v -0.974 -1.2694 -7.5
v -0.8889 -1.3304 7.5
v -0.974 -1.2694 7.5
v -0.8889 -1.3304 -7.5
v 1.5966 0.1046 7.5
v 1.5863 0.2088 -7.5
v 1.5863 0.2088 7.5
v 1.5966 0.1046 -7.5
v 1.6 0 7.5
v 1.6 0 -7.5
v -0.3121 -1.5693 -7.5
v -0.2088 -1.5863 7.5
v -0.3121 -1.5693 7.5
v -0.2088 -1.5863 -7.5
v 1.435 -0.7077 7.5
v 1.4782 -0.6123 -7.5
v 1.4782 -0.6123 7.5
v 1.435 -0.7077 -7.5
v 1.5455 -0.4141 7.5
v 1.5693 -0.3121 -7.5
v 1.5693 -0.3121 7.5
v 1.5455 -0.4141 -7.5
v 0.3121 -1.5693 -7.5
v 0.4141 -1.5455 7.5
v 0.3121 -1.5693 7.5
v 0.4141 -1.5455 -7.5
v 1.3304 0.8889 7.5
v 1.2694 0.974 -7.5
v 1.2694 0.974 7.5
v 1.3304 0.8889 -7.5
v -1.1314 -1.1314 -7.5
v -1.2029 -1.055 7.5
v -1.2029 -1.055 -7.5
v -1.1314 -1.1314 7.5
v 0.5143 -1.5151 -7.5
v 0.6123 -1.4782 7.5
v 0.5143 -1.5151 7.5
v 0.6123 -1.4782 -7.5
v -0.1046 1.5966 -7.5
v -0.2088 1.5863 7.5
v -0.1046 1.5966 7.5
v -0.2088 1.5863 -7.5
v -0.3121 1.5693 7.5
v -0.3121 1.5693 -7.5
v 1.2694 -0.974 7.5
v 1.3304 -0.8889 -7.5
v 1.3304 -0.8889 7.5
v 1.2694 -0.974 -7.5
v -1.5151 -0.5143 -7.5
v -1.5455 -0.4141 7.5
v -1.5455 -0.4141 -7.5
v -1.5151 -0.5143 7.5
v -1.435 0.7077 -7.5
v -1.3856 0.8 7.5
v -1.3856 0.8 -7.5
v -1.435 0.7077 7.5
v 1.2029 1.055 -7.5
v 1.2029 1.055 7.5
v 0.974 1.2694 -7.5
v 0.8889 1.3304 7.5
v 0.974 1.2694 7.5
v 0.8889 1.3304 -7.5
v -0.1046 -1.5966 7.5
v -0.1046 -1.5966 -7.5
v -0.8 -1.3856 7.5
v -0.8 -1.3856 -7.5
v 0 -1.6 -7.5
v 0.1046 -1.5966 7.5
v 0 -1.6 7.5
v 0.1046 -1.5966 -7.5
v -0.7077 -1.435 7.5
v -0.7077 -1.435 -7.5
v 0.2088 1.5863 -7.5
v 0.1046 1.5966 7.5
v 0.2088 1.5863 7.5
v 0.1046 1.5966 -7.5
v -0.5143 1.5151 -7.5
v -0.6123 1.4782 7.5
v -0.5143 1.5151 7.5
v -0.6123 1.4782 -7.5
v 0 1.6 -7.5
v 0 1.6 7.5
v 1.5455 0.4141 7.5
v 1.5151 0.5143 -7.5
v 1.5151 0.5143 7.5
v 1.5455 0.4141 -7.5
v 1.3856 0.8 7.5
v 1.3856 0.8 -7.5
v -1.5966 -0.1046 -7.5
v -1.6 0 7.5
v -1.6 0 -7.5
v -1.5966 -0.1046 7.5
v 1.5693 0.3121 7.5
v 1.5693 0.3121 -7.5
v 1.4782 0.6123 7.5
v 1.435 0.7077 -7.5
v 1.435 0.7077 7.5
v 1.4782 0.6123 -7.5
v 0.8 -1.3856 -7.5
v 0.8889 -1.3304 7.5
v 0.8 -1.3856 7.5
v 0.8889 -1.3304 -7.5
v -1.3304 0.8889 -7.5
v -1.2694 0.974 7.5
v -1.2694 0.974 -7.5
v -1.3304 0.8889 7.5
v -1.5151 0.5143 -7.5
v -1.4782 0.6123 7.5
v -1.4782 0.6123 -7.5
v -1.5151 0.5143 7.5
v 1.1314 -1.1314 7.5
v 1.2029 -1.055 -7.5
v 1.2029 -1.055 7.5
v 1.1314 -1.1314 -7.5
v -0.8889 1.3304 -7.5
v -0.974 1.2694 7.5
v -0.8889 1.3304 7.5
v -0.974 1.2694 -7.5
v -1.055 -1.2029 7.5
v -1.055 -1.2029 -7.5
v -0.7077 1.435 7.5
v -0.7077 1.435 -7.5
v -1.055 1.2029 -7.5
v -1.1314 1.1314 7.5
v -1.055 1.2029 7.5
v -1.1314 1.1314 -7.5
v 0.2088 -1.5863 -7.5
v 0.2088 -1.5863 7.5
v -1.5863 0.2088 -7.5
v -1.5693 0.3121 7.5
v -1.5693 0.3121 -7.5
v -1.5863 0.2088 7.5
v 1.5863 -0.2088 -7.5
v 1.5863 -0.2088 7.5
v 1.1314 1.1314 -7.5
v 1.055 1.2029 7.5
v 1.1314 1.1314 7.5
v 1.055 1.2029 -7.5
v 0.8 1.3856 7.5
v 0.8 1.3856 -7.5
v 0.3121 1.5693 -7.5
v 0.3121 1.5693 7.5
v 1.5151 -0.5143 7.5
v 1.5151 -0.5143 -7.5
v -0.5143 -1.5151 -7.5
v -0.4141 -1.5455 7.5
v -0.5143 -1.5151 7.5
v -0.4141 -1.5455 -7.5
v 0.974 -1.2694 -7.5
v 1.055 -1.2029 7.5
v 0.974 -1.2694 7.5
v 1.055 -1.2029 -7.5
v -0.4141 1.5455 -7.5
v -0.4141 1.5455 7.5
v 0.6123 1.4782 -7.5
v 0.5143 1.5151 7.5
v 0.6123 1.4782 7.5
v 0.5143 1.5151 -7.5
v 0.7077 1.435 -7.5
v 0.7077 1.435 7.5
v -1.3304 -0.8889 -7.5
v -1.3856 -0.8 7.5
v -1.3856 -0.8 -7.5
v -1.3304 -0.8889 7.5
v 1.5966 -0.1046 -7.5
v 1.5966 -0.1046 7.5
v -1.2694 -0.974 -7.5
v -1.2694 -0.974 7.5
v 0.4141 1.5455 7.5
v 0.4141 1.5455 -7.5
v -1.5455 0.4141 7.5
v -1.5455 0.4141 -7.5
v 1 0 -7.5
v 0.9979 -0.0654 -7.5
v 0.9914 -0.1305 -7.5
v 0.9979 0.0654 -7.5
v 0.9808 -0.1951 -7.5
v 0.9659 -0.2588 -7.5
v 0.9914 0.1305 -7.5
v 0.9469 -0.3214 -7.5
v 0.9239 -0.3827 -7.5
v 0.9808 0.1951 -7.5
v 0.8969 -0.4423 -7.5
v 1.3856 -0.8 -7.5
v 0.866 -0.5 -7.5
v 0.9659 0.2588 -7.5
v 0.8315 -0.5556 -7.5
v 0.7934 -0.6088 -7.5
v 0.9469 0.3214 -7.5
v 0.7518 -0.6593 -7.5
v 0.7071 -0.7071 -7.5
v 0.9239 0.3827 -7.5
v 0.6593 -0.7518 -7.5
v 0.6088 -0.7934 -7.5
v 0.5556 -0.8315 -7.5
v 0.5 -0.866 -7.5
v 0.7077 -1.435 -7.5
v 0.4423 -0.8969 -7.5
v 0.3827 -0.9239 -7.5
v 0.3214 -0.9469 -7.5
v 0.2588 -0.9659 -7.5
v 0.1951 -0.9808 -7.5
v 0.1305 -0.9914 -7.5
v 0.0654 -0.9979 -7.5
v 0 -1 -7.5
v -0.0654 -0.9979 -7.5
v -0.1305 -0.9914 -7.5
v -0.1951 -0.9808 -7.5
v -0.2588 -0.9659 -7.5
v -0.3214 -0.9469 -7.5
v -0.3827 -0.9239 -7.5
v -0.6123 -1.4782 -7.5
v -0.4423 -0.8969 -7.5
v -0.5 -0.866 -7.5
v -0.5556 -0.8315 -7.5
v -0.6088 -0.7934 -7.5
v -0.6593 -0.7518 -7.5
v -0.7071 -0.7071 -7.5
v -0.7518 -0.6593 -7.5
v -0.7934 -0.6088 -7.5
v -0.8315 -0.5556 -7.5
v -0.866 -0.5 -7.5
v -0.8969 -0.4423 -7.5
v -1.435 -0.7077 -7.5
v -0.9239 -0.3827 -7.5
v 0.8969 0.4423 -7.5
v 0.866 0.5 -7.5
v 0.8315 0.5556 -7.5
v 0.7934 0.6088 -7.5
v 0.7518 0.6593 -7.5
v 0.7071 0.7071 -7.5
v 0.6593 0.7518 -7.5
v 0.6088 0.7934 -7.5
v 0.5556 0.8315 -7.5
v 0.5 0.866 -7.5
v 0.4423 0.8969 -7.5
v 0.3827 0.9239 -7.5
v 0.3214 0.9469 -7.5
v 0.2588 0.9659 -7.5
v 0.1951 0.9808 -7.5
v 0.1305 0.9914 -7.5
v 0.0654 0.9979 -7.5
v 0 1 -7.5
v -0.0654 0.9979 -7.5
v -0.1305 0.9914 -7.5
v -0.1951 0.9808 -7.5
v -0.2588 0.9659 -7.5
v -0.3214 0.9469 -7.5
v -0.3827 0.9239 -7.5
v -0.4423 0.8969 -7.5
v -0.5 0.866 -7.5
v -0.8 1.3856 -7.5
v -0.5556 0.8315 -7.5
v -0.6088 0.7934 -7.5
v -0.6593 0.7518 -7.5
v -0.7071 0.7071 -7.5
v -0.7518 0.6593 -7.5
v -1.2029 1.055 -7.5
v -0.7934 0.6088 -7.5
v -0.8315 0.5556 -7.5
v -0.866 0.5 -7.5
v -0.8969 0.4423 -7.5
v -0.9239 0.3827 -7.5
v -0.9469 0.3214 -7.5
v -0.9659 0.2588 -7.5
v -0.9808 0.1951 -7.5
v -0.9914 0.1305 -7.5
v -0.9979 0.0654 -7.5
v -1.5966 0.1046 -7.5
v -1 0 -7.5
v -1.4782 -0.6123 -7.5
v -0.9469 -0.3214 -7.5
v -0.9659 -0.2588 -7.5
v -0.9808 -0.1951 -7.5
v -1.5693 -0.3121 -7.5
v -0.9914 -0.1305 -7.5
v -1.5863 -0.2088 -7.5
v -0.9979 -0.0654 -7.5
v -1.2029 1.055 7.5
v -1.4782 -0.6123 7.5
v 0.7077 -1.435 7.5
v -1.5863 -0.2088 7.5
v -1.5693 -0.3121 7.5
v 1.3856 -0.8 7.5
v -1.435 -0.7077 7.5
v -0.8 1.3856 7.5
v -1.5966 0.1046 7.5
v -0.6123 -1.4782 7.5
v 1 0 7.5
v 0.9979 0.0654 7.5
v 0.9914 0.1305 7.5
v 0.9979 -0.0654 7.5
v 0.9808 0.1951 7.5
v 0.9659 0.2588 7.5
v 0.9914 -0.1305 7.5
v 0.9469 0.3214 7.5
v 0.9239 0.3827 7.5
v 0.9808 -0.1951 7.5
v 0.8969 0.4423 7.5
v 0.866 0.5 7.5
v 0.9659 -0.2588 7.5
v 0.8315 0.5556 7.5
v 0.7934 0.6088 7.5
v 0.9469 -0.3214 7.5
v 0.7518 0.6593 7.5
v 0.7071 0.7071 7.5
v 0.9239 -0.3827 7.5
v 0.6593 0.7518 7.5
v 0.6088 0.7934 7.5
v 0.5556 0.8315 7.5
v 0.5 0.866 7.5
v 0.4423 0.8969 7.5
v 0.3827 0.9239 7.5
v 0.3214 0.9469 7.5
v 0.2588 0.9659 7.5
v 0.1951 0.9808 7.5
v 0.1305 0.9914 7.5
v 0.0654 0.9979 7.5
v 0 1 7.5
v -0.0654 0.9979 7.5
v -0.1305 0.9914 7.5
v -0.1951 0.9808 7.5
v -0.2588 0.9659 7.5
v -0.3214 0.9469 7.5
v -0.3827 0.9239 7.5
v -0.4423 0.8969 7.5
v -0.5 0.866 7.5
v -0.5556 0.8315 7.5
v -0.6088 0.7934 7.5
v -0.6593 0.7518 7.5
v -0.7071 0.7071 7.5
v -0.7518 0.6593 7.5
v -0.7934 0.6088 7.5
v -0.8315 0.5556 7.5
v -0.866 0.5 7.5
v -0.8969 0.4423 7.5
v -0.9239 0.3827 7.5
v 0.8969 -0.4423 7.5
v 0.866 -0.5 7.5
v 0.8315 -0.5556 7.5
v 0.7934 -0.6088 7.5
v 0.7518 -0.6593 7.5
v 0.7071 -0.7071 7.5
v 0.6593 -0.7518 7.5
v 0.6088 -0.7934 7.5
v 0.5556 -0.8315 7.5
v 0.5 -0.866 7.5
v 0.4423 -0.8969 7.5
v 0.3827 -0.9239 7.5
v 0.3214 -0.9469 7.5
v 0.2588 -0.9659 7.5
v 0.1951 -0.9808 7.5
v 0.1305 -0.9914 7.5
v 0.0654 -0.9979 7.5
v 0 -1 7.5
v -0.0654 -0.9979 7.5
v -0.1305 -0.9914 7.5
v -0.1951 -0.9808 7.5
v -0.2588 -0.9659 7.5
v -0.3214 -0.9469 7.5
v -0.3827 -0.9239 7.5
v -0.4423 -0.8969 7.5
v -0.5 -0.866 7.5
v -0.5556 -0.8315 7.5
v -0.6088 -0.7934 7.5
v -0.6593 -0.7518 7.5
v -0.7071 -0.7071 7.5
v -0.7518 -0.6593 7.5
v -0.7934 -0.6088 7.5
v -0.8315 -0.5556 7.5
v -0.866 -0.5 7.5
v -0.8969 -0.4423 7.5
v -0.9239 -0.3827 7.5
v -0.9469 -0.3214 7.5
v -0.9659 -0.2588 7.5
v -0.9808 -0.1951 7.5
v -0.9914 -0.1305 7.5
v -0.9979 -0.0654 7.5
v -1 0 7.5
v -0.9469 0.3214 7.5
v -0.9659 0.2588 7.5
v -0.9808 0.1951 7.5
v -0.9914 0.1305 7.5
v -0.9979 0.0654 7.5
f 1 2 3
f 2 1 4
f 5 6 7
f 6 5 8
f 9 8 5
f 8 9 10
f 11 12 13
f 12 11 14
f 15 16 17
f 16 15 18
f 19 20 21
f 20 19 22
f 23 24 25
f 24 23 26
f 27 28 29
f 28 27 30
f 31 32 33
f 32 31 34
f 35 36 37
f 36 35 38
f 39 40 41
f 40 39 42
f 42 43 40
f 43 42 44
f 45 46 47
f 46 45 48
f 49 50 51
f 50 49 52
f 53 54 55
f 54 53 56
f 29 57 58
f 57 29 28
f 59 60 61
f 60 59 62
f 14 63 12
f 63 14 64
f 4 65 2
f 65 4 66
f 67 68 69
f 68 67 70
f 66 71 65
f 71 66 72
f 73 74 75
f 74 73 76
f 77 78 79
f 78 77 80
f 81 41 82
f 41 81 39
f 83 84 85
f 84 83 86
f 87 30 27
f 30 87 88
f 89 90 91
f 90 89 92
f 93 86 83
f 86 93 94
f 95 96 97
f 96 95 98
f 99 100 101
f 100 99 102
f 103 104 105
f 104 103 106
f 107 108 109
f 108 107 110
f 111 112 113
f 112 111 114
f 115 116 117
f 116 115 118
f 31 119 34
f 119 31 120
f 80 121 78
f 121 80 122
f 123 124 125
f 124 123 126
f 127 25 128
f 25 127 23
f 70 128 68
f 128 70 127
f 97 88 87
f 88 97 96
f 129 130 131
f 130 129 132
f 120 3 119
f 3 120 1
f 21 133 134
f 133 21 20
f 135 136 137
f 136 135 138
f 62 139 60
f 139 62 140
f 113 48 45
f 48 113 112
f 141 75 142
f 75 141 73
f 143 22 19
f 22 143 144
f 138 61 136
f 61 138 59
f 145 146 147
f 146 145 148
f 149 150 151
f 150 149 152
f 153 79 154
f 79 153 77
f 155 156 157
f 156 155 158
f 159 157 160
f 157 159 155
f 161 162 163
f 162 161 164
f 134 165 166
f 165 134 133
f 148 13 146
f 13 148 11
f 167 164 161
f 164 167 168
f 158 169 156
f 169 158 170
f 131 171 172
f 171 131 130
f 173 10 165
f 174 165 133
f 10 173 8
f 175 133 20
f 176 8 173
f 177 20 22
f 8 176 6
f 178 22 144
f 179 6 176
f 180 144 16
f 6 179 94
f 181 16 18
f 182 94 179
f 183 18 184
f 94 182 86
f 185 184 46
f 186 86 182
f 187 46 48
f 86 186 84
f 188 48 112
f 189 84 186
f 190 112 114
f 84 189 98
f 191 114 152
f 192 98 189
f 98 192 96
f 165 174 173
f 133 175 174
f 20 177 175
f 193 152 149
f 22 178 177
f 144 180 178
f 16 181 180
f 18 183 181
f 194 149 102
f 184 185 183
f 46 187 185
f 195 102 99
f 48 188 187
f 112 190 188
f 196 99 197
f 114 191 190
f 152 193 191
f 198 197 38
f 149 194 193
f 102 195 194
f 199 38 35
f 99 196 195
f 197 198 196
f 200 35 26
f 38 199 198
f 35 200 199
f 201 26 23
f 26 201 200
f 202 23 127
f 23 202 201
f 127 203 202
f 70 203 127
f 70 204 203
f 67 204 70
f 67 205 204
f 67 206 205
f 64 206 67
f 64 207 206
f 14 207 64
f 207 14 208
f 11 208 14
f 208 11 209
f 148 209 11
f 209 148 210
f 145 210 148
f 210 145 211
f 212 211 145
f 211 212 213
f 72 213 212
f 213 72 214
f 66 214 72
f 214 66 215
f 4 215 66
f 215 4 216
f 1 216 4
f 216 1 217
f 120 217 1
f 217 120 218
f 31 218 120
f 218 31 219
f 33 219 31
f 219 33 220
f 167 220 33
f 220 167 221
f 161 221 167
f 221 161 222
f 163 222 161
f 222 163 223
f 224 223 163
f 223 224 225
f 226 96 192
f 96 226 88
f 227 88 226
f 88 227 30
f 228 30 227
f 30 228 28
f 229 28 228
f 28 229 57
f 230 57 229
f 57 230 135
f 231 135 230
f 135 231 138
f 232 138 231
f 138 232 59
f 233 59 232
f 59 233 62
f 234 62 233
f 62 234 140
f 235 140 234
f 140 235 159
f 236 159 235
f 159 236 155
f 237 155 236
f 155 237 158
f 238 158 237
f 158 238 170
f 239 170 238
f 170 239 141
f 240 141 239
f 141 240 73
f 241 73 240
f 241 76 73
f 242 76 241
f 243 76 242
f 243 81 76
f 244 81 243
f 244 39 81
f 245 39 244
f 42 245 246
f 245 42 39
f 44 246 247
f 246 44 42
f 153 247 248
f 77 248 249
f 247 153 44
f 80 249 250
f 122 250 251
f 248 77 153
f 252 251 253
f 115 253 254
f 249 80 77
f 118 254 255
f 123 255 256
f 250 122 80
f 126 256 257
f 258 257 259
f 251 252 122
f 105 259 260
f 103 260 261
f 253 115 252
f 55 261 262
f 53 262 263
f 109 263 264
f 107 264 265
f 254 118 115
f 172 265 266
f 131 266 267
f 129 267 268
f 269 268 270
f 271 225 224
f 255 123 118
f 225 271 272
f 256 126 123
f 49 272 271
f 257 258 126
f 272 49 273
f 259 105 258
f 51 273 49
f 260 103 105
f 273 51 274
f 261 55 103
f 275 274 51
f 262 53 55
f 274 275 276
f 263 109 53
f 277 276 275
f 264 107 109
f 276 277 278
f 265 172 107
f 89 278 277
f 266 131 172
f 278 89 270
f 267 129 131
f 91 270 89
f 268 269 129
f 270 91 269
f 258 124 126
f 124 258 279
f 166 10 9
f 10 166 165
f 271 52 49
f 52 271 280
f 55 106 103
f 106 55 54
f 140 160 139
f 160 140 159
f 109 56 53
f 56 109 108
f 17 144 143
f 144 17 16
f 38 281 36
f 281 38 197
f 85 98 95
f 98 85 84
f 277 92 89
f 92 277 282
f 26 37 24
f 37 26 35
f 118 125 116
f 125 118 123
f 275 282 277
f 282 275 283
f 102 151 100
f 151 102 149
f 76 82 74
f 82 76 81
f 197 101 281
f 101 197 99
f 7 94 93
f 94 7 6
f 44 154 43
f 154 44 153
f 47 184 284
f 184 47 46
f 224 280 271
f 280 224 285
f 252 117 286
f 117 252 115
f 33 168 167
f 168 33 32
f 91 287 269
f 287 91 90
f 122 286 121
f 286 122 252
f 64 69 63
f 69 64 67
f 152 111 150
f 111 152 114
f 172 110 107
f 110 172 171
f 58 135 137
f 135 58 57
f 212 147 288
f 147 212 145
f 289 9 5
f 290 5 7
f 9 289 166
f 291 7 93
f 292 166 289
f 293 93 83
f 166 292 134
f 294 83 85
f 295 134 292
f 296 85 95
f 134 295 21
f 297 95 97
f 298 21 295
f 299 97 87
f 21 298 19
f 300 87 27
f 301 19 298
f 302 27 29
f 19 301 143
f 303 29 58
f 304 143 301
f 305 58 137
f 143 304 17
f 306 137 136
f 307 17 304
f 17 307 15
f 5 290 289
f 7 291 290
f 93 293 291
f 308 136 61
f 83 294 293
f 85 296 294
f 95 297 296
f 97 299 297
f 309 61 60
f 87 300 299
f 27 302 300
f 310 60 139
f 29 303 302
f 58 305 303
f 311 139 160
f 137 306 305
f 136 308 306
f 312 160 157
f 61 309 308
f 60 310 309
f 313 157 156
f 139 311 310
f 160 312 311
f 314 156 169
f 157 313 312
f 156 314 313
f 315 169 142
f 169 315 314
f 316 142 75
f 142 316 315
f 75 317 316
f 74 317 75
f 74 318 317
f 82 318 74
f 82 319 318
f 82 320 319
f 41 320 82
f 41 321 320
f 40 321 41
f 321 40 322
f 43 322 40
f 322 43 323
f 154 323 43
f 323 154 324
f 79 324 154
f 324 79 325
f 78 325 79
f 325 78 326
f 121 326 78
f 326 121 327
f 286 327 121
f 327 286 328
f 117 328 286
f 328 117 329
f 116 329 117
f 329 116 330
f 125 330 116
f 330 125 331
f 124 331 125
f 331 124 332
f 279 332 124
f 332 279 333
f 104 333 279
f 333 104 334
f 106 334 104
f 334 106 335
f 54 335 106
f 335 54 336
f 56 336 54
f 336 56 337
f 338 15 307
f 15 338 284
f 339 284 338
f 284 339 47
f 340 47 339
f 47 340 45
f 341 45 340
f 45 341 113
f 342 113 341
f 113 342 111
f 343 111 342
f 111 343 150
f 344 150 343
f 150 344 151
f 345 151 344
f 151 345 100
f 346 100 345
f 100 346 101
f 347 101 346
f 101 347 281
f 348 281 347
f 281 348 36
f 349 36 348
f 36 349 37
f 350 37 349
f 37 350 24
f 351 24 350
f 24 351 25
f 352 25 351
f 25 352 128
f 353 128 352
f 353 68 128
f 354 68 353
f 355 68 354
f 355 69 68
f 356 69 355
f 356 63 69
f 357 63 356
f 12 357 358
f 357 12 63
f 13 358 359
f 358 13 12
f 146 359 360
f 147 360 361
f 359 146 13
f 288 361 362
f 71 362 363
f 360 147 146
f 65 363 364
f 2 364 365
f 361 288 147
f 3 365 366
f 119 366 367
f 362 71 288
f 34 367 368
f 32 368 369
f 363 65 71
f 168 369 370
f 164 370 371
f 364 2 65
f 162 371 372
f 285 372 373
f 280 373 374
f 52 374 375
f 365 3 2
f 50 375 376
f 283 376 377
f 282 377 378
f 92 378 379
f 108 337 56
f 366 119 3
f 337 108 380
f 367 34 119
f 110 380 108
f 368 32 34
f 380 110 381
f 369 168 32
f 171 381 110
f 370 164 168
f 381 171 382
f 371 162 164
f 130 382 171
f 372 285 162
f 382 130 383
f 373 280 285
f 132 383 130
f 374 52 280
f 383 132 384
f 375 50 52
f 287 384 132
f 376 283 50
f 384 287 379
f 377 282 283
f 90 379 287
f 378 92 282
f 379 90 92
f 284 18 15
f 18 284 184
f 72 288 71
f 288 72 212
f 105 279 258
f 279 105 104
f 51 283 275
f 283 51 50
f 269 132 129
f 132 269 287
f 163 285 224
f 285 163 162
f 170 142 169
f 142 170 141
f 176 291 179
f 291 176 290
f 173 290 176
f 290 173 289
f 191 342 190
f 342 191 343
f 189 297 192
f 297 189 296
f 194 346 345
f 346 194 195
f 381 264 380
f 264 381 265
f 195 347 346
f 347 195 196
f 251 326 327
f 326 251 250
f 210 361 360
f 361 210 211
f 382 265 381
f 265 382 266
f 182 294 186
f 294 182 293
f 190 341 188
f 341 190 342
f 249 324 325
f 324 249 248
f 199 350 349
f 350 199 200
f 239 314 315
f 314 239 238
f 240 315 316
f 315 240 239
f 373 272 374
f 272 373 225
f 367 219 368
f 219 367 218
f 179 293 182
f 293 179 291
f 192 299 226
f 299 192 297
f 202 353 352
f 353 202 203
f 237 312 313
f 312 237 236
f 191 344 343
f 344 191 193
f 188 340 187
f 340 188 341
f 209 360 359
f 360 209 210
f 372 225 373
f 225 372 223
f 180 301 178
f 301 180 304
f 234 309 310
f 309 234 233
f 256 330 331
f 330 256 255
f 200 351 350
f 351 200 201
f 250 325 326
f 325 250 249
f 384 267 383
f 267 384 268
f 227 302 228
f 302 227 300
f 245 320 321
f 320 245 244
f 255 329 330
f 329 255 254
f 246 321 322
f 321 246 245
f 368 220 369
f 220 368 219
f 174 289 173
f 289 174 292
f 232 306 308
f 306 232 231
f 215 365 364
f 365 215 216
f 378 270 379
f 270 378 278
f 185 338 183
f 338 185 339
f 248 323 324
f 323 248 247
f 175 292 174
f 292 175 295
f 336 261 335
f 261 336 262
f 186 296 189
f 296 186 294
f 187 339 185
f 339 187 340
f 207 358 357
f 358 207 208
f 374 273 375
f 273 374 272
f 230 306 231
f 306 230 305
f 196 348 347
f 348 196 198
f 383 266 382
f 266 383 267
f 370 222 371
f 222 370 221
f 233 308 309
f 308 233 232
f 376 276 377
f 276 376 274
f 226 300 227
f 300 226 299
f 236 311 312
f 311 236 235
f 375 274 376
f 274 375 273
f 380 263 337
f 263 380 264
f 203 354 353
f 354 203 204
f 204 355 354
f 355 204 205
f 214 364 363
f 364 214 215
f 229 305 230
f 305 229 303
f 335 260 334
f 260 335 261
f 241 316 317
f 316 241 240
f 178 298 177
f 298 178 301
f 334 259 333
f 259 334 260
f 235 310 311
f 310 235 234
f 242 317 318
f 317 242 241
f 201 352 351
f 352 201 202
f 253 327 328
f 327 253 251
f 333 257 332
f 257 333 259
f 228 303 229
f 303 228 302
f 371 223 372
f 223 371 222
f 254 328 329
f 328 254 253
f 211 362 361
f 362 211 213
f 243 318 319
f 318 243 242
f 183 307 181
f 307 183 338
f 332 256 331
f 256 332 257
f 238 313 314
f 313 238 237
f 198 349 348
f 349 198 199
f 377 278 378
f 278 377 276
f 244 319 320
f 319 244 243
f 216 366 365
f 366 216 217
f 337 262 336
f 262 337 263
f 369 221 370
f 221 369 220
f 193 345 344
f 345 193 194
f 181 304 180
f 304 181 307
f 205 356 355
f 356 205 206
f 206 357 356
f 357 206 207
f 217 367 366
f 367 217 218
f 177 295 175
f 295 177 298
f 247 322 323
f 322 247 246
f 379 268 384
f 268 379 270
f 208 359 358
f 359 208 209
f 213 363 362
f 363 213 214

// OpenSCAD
// Heatshrink sleeving / tubing (single connected solid)

// Parameters
length = 15; //[8:30:1]
original_id = 2.0; //[1.0:4.0:0.1]
original_od = 3.2; //[1.6:6.4:0.1]
forced_id = 0; //[0:6:0.1]
center = true; //[0:1:1]
overlap = 0.8; //[0.5:2:0.1]

// Smoothness for round tube (avoid hex/prismatic look)
$fn = 96;

// Derived dimensions
id = (forced_id > 0) ? forced_id : original_id;
od = (forced_id > 0) ? (original_od + (forced_id - original_id)) : original_od;

// Ensure valid wall thickness and non-empty geometry
min_wall = 0.25;
od_safe = max(od, id + 2*min_wall);
id_safe = min(id, od_safe - 2*min_wall);

module tubing() {
  color([0.85, 0.85, 0.8])
  difference() {
    cylinder(h=length, r=od_safe/2, center=center);
    cylinder(h=length + 2*overlap, r=id_safe/2, center=center);
  }
}

// One connected solid: just the tube (no floating/extra parts)
tubing();
